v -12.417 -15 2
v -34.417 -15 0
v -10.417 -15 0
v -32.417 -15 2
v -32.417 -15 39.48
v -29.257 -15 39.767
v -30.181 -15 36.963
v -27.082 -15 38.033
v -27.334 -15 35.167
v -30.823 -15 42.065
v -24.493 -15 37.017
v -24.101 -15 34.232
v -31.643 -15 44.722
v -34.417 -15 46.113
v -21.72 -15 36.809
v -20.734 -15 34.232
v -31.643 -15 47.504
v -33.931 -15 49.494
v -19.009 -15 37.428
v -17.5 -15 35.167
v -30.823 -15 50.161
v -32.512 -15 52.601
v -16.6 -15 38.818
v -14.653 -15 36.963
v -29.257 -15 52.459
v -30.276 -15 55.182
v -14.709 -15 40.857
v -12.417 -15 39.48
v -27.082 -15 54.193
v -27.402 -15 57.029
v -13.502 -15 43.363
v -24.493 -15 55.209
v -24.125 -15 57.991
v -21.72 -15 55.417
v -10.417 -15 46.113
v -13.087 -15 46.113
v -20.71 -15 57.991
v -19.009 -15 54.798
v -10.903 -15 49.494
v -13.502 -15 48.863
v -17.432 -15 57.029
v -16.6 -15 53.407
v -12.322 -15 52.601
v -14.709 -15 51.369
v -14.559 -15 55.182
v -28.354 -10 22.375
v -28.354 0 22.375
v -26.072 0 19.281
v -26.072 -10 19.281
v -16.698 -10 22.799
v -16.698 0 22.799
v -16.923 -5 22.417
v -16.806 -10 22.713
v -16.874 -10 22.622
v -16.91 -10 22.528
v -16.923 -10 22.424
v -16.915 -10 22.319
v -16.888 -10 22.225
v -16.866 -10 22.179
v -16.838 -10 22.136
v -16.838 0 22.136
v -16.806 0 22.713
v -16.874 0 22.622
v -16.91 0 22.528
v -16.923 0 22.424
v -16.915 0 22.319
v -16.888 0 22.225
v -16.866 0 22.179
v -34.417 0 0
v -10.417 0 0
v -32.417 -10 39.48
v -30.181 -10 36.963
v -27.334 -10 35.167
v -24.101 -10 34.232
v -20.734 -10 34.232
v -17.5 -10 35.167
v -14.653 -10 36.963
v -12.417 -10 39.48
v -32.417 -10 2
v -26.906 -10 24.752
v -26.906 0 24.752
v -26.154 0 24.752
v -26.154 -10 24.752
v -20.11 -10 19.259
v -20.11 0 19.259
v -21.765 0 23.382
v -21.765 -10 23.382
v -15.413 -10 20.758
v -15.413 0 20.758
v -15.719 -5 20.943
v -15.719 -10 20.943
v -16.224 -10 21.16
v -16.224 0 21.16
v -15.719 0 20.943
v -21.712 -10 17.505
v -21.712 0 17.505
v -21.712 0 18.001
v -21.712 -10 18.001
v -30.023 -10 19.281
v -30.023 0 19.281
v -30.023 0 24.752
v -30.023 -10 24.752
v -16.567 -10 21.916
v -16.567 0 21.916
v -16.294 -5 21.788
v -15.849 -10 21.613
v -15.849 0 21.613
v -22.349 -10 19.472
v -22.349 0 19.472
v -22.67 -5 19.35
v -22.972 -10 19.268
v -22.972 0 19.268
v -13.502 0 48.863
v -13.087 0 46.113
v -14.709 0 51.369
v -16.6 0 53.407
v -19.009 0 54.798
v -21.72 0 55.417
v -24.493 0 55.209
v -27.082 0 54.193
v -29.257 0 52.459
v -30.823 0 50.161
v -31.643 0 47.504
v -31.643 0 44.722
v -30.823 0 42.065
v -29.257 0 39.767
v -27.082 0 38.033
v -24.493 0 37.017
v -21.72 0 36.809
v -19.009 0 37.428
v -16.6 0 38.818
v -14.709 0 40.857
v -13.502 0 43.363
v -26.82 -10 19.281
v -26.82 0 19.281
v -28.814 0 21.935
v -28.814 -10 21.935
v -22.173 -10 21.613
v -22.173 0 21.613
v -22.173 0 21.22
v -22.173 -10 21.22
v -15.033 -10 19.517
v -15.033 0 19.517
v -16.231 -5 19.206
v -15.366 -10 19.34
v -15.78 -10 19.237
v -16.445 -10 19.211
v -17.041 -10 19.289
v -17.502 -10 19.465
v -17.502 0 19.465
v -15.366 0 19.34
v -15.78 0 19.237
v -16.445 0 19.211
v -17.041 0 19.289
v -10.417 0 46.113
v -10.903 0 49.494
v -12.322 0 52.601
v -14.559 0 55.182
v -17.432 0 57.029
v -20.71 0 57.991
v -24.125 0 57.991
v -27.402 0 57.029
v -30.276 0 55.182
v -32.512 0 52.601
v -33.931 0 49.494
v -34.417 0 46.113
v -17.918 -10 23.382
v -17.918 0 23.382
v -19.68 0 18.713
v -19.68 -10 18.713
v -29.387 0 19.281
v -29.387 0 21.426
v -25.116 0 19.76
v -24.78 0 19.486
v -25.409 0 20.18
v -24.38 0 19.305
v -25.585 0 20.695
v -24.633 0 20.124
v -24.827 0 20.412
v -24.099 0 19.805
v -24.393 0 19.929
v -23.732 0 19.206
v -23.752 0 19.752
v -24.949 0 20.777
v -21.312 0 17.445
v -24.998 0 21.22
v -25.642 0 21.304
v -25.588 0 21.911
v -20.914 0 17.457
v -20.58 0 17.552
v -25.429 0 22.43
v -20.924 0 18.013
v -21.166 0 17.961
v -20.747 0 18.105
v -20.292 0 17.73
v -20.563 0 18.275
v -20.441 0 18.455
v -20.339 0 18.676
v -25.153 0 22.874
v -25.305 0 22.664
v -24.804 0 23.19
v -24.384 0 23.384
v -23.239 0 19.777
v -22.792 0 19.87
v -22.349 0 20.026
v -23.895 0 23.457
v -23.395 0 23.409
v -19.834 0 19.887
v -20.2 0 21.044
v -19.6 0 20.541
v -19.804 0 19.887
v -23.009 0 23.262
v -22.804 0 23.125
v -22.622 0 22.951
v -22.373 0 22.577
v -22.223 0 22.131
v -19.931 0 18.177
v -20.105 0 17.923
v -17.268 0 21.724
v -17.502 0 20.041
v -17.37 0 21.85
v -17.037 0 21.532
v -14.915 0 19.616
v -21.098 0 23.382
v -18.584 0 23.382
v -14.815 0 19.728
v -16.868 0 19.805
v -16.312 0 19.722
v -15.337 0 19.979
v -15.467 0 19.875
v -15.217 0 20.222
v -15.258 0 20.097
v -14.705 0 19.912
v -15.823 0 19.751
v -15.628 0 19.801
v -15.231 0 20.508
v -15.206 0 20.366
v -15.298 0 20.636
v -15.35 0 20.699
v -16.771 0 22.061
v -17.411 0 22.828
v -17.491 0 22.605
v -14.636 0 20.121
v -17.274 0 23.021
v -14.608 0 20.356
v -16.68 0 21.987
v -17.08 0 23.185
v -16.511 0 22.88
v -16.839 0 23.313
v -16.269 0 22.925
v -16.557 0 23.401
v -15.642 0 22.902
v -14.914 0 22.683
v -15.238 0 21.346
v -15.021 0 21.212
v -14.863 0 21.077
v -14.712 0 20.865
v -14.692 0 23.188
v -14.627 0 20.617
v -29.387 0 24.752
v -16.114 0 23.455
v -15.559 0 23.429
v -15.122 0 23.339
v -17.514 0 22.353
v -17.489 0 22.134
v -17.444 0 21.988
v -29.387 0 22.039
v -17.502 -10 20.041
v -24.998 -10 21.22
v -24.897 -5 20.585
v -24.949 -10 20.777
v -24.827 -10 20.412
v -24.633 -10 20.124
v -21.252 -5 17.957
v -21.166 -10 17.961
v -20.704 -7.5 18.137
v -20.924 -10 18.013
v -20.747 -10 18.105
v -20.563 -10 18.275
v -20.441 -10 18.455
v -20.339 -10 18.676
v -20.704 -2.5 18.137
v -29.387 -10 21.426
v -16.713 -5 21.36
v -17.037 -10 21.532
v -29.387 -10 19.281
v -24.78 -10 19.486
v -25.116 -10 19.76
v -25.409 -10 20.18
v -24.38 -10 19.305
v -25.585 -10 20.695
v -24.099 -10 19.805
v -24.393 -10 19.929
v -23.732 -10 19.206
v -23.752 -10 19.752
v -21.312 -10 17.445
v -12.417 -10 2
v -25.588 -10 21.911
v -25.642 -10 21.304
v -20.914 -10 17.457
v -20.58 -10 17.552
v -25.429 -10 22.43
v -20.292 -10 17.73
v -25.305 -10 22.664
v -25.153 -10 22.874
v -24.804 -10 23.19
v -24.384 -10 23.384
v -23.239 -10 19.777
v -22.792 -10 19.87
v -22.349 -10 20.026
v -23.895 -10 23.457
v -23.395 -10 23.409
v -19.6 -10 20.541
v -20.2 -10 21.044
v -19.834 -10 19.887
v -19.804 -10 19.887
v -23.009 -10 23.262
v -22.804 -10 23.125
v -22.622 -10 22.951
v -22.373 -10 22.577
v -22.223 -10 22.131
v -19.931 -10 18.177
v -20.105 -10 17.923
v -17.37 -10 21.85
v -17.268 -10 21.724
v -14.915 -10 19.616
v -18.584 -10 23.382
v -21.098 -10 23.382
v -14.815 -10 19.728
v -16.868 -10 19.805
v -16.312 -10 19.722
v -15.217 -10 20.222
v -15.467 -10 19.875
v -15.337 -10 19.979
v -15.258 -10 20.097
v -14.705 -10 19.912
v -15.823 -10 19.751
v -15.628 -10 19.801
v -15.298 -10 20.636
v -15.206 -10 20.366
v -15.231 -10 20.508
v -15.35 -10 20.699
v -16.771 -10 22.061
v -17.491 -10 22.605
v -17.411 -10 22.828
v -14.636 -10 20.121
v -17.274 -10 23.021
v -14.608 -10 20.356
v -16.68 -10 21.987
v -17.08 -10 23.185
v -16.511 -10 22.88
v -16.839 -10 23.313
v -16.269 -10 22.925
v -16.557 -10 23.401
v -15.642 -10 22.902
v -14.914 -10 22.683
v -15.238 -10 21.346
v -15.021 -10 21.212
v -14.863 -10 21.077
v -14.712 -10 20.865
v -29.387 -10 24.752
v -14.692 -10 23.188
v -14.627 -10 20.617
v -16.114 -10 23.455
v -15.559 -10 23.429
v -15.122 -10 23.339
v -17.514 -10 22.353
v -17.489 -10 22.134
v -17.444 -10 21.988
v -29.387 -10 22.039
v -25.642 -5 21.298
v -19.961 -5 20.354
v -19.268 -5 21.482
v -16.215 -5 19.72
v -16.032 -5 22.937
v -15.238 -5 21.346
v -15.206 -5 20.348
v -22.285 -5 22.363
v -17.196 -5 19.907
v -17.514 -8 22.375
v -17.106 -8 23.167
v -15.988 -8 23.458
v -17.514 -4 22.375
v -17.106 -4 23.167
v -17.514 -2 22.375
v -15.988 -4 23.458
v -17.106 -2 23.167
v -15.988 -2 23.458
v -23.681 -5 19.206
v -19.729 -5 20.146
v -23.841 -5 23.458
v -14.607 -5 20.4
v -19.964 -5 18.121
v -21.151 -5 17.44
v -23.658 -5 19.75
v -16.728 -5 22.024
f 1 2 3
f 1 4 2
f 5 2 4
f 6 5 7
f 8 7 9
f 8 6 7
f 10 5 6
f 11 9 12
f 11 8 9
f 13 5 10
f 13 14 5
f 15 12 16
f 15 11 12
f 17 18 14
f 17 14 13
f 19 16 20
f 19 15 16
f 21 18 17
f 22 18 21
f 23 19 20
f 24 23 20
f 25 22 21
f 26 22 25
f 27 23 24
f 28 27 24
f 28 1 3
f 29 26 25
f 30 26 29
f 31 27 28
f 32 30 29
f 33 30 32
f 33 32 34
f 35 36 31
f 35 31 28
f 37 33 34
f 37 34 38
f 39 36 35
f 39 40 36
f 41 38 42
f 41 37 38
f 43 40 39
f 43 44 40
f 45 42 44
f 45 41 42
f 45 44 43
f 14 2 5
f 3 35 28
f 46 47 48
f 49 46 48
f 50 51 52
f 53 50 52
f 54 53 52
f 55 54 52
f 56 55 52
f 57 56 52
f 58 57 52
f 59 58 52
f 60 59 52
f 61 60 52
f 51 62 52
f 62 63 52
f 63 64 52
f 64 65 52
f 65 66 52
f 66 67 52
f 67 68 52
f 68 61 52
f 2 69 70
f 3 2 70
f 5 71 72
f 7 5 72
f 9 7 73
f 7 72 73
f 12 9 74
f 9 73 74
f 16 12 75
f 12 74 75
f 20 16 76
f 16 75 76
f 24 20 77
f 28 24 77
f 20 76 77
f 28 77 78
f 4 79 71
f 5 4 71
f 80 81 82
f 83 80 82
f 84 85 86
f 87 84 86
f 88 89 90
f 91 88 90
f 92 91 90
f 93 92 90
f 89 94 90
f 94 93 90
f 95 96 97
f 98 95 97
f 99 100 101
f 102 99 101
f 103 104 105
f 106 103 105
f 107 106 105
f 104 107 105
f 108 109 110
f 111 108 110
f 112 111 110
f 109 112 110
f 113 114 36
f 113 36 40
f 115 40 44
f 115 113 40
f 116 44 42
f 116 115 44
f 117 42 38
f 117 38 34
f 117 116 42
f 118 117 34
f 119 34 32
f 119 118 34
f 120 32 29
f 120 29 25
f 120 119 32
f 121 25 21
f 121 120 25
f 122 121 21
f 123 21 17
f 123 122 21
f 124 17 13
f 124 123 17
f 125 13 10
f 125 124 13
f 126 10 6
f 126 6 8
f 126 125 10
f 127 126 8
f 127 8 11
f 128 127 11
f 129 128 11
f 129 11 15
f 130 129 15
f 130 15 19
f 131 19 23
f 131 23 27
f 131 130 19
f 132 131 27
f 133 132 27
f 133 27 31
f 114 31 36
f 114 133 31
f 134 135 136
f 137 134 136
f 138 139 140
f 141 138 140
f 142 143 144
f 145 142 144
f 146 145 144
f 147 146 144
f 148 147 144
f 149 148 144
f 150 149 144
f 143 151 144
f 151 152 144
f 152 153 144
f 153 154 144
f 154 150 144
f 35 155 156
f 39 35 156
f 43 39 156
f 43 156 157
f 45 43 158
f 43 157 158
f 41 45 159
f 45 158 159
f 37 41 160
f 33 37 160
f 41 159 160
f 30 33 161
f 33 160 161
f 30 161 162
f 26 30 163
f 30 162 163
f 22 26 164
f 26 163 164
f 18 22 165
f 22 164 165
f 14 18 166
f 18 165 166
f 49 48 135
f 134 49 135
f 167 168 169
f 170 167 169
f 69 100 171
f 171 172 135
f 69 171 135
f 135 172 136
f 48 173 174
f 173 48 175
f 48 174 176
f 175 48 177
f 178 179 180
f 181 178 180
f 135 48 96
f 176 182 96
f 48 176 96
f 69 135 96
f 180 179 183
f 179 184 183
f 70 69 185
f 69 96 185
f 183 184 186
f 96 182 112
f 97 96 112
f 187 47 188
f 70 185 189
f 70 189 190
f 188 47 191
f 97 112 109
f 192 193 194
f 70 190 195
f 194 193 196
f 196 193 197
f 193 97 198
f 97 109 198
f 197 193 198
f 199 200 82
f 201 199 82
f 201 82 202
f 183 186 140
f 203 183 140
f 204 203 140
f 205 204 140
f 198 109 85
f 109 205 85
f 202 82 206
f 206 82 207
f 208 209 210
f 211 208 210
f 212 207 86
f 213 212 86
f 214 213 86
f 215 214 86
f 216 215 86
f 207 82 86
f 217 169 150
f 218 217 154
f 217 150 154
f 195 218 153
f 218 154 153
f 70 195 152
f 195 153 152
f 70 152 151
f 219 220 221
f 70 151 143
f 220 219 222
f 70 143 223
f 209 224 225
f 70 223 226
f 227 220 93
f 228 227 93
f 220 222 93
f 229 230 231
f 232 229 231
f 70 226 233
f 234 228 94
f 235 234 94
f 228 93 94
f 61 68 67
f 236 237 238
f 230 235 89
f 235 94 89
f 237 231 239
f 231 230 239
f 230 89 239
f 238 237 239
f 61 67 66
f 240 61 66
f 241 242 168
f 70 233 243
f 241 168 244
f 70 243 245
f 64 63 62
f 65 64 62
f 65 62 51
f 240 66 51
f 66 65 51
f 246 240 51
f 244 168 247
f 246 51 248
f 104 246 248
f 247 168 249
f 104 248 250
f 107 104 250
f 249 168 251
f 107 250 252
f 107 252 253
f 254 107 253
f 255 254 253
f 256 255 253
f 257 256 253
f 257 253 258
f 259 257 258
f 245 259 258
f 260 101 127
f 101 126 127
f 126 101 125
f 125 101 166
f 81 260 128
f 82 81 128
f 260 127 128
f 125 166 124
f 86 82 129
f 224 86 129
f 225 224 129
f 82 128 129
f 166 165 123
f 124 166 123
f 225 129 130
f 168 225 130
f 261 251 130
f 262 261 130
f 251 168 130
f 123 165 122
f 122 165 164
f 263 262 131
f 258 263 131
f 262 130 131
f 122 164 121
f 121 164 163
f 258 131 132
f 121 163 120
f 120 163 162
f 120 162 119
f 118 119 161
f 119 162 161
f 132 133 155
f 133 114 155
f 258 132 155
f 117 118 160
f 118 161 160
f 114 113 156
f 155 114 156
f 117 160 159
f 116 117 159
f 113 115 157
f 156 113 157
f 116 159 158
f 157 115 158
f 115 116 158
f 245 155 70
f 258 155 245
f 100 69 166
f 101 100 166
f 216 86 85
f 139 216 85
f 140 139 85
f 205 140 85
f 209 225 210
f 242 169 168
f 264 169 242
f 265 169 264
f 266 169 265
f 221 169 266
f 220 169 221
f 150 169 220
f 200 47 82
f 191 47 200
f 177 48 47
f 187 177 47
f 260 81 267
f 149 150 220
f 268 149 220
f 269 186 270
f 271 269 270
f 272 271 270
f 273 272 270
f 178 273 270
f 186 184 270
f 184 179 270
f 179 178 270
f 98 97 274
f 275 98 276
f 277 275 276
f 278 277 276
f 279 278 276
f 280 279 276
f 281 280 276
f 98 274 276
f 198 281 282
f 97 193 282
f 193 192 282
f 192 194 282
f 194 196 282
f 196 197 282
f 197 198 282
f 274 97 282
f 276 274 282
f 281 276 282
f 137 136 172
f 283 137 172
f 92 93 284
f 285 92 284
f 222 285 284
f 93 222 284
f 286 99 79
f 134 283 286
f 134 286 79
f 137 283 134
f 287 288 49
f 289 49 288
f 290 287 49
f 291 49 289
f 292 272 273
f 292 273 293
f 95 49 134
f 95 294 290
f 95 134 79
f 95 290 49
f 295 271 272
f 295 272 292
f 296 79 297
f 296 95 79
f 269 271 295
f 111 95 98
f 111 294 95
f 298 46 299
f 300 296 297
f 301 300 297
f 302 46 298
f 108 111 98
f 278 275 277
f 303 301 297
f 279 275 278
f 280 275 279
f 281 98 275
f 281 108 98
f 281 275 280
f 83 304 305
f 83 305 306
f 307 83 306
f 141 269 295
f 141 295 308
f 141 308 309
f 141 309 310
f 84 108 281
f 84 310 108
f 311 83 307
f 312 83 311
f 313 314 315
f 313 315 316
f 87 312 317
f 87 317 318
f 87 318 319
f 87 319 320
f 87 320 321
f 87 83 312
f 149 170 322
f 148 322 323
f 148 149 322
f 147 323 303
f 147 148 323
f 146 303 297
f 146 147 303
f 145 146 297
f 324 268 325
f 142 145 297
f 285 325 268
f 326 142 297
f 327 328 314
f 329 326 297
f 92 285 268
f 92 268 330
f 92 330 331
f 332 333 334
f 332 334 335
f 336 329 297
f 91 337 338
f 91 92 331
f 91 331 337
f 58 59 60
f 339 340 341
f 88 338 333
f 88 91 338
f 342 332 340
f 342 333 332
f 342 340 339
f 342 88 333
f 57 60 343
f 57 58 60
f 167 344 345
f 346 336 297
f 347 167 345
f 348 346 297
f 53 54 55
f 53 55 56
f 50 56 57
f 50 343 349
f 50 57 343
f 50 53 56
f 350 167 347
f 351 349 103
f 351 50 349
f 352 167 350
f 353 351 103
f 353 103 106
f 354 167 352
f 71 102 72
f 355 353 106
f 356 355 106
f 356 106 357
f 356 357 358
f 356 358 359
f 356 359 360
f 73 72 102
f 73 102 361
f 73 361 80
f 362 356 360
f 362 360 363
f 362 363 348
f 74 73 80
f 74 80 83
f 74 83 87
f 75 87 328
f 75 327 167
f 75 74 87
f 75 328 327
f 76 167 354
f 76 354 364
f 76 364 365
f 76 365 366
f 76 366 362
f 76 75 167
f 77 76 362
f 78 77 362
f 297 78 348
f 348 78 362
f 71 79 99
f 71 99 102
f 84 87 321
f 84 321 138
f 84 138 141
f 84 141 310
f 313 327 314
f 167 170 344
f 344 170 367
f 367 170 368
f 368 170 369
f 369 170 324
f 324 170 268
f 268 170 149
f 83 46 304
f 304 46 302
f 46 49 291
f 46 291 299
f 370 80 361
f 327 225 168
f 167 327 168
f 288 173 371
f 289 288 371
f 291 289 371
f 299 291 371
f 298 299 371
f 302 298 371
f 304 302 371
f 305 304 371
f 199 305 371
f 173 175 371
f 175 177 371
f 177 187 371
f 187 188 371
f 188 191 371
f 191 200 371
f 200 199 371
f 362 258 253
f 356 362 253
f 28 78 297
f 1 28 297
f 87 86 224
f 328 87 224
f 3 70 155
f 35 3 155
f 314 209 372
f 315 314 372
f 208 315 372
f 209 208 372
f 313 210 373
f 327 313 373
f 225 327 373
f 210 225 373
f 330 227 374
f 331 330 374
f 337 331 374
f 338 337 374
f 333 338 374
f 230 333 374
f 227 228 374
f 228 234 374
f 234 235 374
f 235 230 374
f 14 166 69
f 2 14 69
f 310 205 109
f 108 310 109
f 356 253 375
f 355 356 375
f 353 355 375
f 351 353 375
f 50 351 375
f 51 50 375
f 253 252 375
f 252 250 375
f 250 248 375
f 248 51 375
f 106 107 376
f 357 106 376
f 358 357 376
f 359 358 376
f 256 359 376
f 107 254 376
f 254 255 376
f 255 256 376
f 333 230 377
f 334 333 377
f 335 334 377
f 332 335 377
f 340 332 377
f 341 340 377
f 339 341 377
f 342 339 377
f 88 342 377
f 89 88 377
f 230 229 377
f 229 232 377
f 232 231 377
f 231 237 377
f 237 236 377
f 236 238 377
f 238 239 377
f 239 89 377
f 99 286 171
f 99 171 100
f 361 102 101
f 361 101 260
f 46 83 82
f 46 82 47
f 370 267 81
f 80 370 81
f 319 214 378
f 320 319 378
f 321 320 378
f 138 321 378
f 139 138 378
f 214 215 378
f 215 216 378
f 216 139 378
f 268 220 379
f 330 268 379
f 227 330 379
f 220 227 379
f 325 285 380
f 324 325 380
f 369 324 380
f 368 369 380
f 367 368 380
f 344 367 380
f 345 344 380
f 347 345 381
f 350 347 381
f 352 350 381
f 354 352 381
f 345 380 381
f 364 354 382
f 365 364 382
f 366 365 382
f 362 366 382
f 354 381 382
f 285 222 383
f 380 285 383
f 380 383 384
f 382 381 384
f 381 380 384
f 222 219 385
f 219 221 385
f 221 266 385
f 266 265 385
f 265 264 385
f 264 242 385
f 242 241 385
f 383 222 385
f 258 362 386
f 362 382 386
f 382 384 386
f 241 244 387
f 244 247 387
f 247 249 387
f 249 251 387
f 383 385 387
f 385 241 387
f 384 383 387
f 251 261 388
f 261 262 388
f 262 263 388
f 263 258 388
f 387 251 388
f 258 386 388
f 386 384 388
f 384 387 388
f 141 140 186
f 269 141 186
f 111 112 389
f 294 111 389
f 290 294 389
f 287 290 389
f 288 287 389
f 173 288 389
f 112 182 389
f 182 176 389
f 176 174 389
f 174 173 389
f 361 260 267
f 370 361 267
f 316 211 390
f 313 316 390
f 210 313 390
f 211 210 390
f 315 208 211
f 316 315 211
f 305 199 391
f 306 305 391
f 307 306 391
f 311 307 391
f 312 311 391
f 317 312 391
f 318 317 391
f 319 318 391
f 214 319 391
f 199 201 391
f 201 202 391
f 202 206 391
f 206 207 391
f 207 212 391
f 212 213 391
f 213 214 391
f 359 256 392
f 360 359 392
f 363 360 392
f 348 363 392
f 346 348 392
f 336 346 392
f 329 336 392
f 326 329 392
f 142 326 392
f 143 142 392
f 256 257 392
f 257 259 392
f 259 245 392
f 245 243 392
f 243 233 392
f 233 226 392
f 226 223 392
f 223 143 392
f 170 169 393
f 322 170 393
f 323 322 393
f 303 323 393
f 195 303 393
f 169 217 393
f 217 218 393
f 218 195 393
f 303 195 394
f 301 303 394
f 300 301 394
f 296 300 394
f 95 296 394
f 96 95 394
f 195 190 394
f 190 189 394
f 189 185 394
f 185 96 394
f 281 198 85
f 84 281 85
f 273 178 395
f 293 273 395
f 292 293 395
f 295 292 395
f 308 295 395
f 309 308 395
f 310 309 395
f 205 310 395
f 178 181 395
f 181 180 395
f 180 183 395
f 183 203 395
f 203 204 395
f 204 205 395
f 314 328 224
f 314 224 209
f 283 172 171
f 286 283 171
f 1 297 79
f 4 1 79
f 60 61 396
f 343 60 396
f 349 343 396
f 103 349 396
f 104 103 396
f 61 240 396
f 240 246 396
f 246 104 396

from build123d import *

# Parameters (mm, degrees)
F0_R     = 9.33
F1_DEPTH = 15
F2_DEPTH = 10


with BuildPart() as f1:
    # F0 (on Front) → F1 (new body)
    with BuildSketch(Plane.XZ):
        with BuildLine():
            ThreePointArc((-12.417365469, 39.4797180027), (-10.928240176, 42.6488659683), (-10.417365469, 46.1129675834))
            ThreePointArc((-10.417365469, 46.1129675834), (-22.417365469, 58.1129675834), (-34.417365469, 46.1129675834))
            ThreePointArc((-34.417365469, 46.1129675834), (-33.9064907621, 42.6488659683), (-32.417365469, 39.4797180027))
            ThreePointArc((-32.417365469, 39.4797180027), (-22.417365469, 34.1129675834), (-12.417365469, 39.4797180027))
        make_face()
        with Locations((-22.417365469, 46.1129675834)):
            Circle(F0_R, mode=Mode.SUBTRACT)
        with BuildLine():
            Line((-10.417365469, 0), (-10.417365469, 46.1129675834))
            ThreePointArc((-10.417365469, 46.1129675834), (-10.928240176, 42.6488659683), (-12.417365469, 39.4797180027))
            Line((-12.417365469, 39.4797180027), (-12.417365469, 2))
            Line((-12.417365469, 2), (-32.417365469, 2))
            Line((-32.417365469, 2), (-32.417365469, 39.4797180027))
            ThreePointArc((-32.417365469, 39.4797180027), (-33.9064907621, 42.6488659683), (-34.417365469, 46.1129675834))
            Line((-34.417365469, 46.1129675834), (-34.417365469, 0))
            Line((-34.417365469, 0), (-10.417365469, 0))
        make_face()
    extrude(amount=F1_DEPTH)

    # F0 (on Front) → F2 (join)
    with BuildSketch(Plane.XZ):
        with BuildLine():
            Line((-12.417365469, 2), (-12.417365469, 39.4797180027))
            ThreePointArc((-12.417365469, 39.4797180027), (-22.417365469, 34.1129675834), (-32.417365469, 39.4797180027))
            Line((-32.417365469, 39.4797180027), (-32.417365469, 2))
            Line((-32.417365469, 2), (-12.417365469, 2))
        make_face()
        with BuildLine():
            add(Edge.make_bspline(
                [(-22.9718386234, 19.2682127741), (-23.2651889221, 19.2059506699), (-23.6806687329, 19.2059506699)],
                knots=[0, 0, 0, 1, 1, 1], degree=2))
            add(Edge.make_bspline(
                [(-23.6806687329, 19.2059506699), (-24.5894559848, 19.2059506699), (-25.1156905003, 19.760322867)],
                knots=[0, 0, 0, 1, 1, 1], degree=2))
            add(Edge.make_bspline(
                [(-25.1156905003, 19.760322867), (-25.6419250157, 20.3146950642), (-25.6419250157, 21.2977179019)],
                knots=[0, 0, 0, 1, 1, 1], degree=2))
            add(Edge.make_bspline(
                [(-25.6419250157, 21.2977179019), (-25.6419250157, 22.2903195249), (-25.1534069672, 22.8740267519)],
                knots=[0, 0, 0, 1, 1, 1], degree=2))
            add(Edge.make_bspline(
                [(-25.1534069672, 22.8740267519), (-24.6648889188, 23.4577339789), (-23.8411133861, 23.4577339789)],
                knots=[0, 0, 0, 1, 1, 1], degree=2))
            add(Edge.make_bspline(
                [(-23.8411133861, 23.4577339789), (-23.0712185205, 23.4577339789), (-22.6222129612, 22.950657034)],
                knots=[0, 0, 0, 1, 1, 1], degree=2))
            add(Edge.make_bspline(
                [(-22.6222129612, 22.950657034), (-22.173207402, 22.4435800891), (-22.173207402, 21.6126204674)],
                knots=[0, 0, 0, 1, 1, 1], degree=2))
            Line((-22.173207402, 21.6126204674), (-22.173207402, 21.2198902716))
            Line((-22.173207402, 21.2198902716), (-24.9977517067, 21.2198902716))
            add(Edge.make_bspline(
                [(-24.9977517067, 21.2198902716), (-24.9785941362, 20.4978893323), (-24.6325605185, 20.123718033)],
                knots=[0, 0, 0, 1, 1, 1], degree=2))
            add(Edge.make_bspline(
                [(-24.6325605185, 20.123718033), (-24.2865269008, 19.7495467336), (-23.6579191179, 19.7495467336)],
                knots=[0, 0, 0, 1, 1, 1], degree=2))
            add(Edge.make_bspline(
                [(-23.6579191179, 19.7495467336), (-22.9957855865, 19.7495467336), (-22.3492175812, 20.0261341581)],
                knots=[0, 0, 0, 1, 1, 1], degree=2))
            Line((-22.3492175812, 20.0261341581), (-22.3492175812, 19.4717619609))
            add(Edge.make_bspline(
                [(-22.3492175812, 19.4717619609), (-22.6784883246, 19.3304748783), (-22.9718386234, 19.2682127741)],
                knots=[0, 0, 0, 1, 1, 1], degree=2))
        make_face(mode=Mode.SUBTRACT)
        Polygon((-28.3539185936, 22.3753312441), (-26.0717730044, 19.2813836038), (-26.8201156032, 19.2813836038), (-28.8137002863, 21.9347071219), (-29.3872300539, 21.4258341548), (-29.3872300539, 19.2813836038), (-30.0230219258, 19.2813836038), (-30.0230219258, 24.7520673377), (-29.3872300539, 24.7520673377), (-29.3872300539, 22.0388764117), (-26.9063246706, 24.7520673377), (-26.1543900273, 24.7520673377), align=None, mode=Mode.SUBTRACT)
        with BuildLine():
            Line((-20.1101765257, 19.2586339888), (-21.7649116801, 23.382301045))
            Line((-21.7649116801, 23.382301045), (-21.0979887561, 23.382301045))
            Line((-21.0979887561, 23.382301045), (-20.1999776376, 21.0438800924))
            add(Edge.make_bspline(
                [(-20.1999776376, 21.0438800924), (-19.9054299907, 20.2428541747), (-19.8335891012, 19.8872417718)],
                knots=[0, 0, 0, 1, 1, 1], degree=2))
            Line((-19.8335891012, 19.8872417718), (-19.8036553973, 19.8872417718))
            add(Edge.make_bspline(
                [(-19.8036553973, 19.8872417718), (-19.755761471, 20.078817477), (-19.6001062104, 20.540993866)],
                knots=[0, 0, 0, 1, 1, 1], degree=2))
            add(Edge.make_bspline(
                [(-19.6001062104, 20.540993866), (-19.4444509499, 21.003170255), (-18.5835576243, 23.382301045)],
                knots=[0, 0, 0, 1, 1, 1], degree=2))
            Line((-18.5835576243, 23.382301045), (-17.9178320484, 23.382301045))
            Line((-17.9178320484, 23.382301045), (-19.680328537, 18.7126432288))
            add(Edge.make_bspline(
                [(-19.680328537, 18.7126432288), (-19.9425477836, 18.0205759934), (-20.2921734457, 17.7302190651)],
                knots=[0, 0, 0, 1, 1, 1], degree=2))
            add(Edge.make_bspline(
                [(-20.2921734457, 17.7302190651), (-20.6417991079, 17.4398621368), (-21.150672075, 17.4398621368)],
                knots=[0, 0, 0, 1, 1, 1], degree=2))
            add(Edge.make_bspline(
                [(-21.150672075, 17.4398621368), (-21.4356409366, 17.4398621368), (-21.7122283611, 17.5045189373)],
                knots=[0, 0, 0, 1, 1, 1], degree=2))
            Line((-21.7122283611, 17.5045189373), (-21.7122283611, 18.0014184229))
            add(Edge.make_bspline(
                [(-21.7122283611, 18.0014184229), (-21.506284478, 17.9571165411), (-21.2524466685, 17.9571165411)],
                knots=[0, 0, 0, 1, 1, 1], degree=2))
            add(Edge.make_bspline(
                [(-21.2524466685, 17.9571165411), (-20.6118654039, 17.9571165411), (-20.3388700239, 18.6755254359)],
                knots=[0, 0, 0, 1, 1, 1], degree=2))
            Line((-20.3388700239, 18.6755254359), (-20.1101765257, 19.2586339888))
        make_face(mode=Mode.SUBTRACT)
        with BuildLine():
            add(Edge.make_bspline(
                [(-14.8633968974, 21.0774058408), (-14.6071643915, 20.8080025053), (-14.6071643915, 20.3997067834)],
                knots=[0, 0, 0, 1, 1, 1], degree=2))
            add(Edge.make_bspline(
                [(-14.6071643915, 20.3997067834), (-14.6071643915, 19.8273743639), (-15.0334203358, 19.5166625169)],
                knots=[0, 0, 0, 1, 1, 1], degree=2))
            add(Edge.make_bspline(
                [(-15.0334203358, 19.5166625169), (-15.45967628, 19.2059506699), (-16.2307684938, 19.2059506699)],
                knots=[0, 0, 0, 1, 1, 1], degree=2))
            add(Edge.make_bspline(
                [(-16.2307684938, 19.2059506699), (-17.0461625894, 19.2059506699), (-17.5023522376, 19.464577872)],
                knots=[0, 0, 0, 1, 1, 1], degree=2))
            Line((-17.5023522376, 19.464577872), (-17.5023522376, 20.040502336))
            add(Edge.make_bspline(
                [(-17.5023522376, 20.040502336), (-17.2066072426, 19.8908338162), (-16.8683563879, 19.8052234229)],
                knots=[0, 0, 0, 1, 1, 1], degree=2))
            add(Edge.make_bspline(
                [(-16.8683563879, 19.8052234229), (-16.5301055333, 19.7196130296), (-16.2152029677, 19.7196130296)],
                knots=[0, 0, 0, 1, 1, 1], degree=2))
            add(Edge.make_bspline(
                [(-16.2152029677, 19.7196130296), (-15.7290796156, 19.7196130296), (-15.4674590431, 19.8746696161)],
                knots=[0, 0, 0, 1, 1, 1], degree=2))
            add(Edge.make_bspline(
                [(-15.4674590431, 19.8746696161), (-15.2058384705, 20.0297262026), (-15.2058384705, 20.3482208126)],
                knots=[0, 0, 0, 1, 1, 1], degree=2))
            add(Edge.make_bspline(
                [(-15.2058384705, 20.3482208126), (-15.2058384705, 20.5876904442), (-15.4129797019, 20.7577138826)],
                knots=[0, 0, 0, 1, 1, 1], degree=2))
            add(Edge.make_bspline(
                [(-15.4129797019, 20.7577138826), (-15.6201209332, 20.9277373211), (-16.2235844048, 21.1600228637)],
                knots=[0, 0, 0, 1, 1, 1], degree=2))
            add(Edge.make_bspline(
                [(-16.2235844048, 21.1600228637), (-16.7959168244, 21.3731508358), (-17.0371824782, 21.5323981409)],
                knots=[0, 0, 0, 1, 1, 1], degree=2))
            add(Edge.make_bspline(
                [(-17.0371824782, 21.5323981409), (-17.278448132, 21.6916454459), (-17.3963869256, 21.8933986105)],
                knots=[0, 0, 0, 1, 1, 1], degree=2))
            add(Edge.make_bspline(
                [(-17.3963869256, 21.8933986105), (-17.5143257192, 22.0951517751), (-17.5143257192, 22.3753312441)],
                knots=[0, 0, 0, 1, 1, 1], degree=2))
            add(Edge.make_bspline(
                [(-17.5143257192, 22.3753312441), (-17.5143257192, 22.8770201223), (-17.1060299973, 23.1673770506)],
                knots=[0, 0, 0, 1, 1, 1], degree=2))
            add(Edge.make_bspline(
                [(-17.1060299973, 23.1673770506), (-16.6977342754, 23.4577339789), (-15.9877068177, 23.4577339789)],
                knots=[0, 0, 0, 1, 1, 1], degree=2))
            add(Edge.make_bspline(
                [(-15.9877068177, 23.4577339789), (-15.3255732863, 23.4577339789), (-14.6921761108, 23.1883306434)],
                knots=[0, 0, 0, 1, 1, 1], degree=2))
            Line((-14.6921761108, 23.1883306434), (-14.91368552, 22.6830497207))
            add(Edge.make_bspline(
                [(-14.91368552, 22.6830497207), (-15.5303198214, 22.9368875302), (-16.0320086996, 22.9368875302)],
                knots=[0, 0, 0, 1, 1, 1], degree=2))
            add(Edge.make_bspline(
                [(-16.0320086996, 22.9368875302), (-16.4738301699, 22.9368875302), (-16.6983329495, 22.7985938179)],
                knots=[0, 0, 0, 1, 1, 1], degree=2))
            add(Edge.make_bspline(
                [(-16.6983329495, 22.7985938179), (-16.9228357291, 22.6603001057), (-16.9228357291, 22.4172384296)],
                knots=[0, 0, 0, 1, 1, 1], degree=2))
            add(Edge.make_bspline(
                [(-16.9228357291, 22.4172384296), (-16.9228357291, 22.2520043838), (-16.838422684, 22.1364602866)],
                knots=[0, 0, 0, 1, 1, 1], degree=2))
            add(Edge.make_bspline(
                [(-16.838422684, 22.1364602866), (-16.7540096388, 22.0209161893), (-16.5672233262, 21.9161482255)],
                knots=[0, 0, 0, 1, 1, 1], degree=2))
            add(Edge.make_bspline(
                [(-16.5672233262, 21.9161482255), (-16.3804370135, 21.8113802617), (-15.8488144314, 21.6126204674)],
                knots=[0, 0, 0, 1, 1, 1], degree=2))
            add(Edge.make_bspline(
                [(-15.8488144314, 21.6126204674), (-15.1196294032, 21.3468091764), (-14.8633968974, 21.0774058408)],
                knots=[0, 0, 0, 1, 1, 1], degree=2))
        make_face(mode=Mode.SUBTRACT)
    extrude(amount=F2_DEPTH)


solid = f1.part
